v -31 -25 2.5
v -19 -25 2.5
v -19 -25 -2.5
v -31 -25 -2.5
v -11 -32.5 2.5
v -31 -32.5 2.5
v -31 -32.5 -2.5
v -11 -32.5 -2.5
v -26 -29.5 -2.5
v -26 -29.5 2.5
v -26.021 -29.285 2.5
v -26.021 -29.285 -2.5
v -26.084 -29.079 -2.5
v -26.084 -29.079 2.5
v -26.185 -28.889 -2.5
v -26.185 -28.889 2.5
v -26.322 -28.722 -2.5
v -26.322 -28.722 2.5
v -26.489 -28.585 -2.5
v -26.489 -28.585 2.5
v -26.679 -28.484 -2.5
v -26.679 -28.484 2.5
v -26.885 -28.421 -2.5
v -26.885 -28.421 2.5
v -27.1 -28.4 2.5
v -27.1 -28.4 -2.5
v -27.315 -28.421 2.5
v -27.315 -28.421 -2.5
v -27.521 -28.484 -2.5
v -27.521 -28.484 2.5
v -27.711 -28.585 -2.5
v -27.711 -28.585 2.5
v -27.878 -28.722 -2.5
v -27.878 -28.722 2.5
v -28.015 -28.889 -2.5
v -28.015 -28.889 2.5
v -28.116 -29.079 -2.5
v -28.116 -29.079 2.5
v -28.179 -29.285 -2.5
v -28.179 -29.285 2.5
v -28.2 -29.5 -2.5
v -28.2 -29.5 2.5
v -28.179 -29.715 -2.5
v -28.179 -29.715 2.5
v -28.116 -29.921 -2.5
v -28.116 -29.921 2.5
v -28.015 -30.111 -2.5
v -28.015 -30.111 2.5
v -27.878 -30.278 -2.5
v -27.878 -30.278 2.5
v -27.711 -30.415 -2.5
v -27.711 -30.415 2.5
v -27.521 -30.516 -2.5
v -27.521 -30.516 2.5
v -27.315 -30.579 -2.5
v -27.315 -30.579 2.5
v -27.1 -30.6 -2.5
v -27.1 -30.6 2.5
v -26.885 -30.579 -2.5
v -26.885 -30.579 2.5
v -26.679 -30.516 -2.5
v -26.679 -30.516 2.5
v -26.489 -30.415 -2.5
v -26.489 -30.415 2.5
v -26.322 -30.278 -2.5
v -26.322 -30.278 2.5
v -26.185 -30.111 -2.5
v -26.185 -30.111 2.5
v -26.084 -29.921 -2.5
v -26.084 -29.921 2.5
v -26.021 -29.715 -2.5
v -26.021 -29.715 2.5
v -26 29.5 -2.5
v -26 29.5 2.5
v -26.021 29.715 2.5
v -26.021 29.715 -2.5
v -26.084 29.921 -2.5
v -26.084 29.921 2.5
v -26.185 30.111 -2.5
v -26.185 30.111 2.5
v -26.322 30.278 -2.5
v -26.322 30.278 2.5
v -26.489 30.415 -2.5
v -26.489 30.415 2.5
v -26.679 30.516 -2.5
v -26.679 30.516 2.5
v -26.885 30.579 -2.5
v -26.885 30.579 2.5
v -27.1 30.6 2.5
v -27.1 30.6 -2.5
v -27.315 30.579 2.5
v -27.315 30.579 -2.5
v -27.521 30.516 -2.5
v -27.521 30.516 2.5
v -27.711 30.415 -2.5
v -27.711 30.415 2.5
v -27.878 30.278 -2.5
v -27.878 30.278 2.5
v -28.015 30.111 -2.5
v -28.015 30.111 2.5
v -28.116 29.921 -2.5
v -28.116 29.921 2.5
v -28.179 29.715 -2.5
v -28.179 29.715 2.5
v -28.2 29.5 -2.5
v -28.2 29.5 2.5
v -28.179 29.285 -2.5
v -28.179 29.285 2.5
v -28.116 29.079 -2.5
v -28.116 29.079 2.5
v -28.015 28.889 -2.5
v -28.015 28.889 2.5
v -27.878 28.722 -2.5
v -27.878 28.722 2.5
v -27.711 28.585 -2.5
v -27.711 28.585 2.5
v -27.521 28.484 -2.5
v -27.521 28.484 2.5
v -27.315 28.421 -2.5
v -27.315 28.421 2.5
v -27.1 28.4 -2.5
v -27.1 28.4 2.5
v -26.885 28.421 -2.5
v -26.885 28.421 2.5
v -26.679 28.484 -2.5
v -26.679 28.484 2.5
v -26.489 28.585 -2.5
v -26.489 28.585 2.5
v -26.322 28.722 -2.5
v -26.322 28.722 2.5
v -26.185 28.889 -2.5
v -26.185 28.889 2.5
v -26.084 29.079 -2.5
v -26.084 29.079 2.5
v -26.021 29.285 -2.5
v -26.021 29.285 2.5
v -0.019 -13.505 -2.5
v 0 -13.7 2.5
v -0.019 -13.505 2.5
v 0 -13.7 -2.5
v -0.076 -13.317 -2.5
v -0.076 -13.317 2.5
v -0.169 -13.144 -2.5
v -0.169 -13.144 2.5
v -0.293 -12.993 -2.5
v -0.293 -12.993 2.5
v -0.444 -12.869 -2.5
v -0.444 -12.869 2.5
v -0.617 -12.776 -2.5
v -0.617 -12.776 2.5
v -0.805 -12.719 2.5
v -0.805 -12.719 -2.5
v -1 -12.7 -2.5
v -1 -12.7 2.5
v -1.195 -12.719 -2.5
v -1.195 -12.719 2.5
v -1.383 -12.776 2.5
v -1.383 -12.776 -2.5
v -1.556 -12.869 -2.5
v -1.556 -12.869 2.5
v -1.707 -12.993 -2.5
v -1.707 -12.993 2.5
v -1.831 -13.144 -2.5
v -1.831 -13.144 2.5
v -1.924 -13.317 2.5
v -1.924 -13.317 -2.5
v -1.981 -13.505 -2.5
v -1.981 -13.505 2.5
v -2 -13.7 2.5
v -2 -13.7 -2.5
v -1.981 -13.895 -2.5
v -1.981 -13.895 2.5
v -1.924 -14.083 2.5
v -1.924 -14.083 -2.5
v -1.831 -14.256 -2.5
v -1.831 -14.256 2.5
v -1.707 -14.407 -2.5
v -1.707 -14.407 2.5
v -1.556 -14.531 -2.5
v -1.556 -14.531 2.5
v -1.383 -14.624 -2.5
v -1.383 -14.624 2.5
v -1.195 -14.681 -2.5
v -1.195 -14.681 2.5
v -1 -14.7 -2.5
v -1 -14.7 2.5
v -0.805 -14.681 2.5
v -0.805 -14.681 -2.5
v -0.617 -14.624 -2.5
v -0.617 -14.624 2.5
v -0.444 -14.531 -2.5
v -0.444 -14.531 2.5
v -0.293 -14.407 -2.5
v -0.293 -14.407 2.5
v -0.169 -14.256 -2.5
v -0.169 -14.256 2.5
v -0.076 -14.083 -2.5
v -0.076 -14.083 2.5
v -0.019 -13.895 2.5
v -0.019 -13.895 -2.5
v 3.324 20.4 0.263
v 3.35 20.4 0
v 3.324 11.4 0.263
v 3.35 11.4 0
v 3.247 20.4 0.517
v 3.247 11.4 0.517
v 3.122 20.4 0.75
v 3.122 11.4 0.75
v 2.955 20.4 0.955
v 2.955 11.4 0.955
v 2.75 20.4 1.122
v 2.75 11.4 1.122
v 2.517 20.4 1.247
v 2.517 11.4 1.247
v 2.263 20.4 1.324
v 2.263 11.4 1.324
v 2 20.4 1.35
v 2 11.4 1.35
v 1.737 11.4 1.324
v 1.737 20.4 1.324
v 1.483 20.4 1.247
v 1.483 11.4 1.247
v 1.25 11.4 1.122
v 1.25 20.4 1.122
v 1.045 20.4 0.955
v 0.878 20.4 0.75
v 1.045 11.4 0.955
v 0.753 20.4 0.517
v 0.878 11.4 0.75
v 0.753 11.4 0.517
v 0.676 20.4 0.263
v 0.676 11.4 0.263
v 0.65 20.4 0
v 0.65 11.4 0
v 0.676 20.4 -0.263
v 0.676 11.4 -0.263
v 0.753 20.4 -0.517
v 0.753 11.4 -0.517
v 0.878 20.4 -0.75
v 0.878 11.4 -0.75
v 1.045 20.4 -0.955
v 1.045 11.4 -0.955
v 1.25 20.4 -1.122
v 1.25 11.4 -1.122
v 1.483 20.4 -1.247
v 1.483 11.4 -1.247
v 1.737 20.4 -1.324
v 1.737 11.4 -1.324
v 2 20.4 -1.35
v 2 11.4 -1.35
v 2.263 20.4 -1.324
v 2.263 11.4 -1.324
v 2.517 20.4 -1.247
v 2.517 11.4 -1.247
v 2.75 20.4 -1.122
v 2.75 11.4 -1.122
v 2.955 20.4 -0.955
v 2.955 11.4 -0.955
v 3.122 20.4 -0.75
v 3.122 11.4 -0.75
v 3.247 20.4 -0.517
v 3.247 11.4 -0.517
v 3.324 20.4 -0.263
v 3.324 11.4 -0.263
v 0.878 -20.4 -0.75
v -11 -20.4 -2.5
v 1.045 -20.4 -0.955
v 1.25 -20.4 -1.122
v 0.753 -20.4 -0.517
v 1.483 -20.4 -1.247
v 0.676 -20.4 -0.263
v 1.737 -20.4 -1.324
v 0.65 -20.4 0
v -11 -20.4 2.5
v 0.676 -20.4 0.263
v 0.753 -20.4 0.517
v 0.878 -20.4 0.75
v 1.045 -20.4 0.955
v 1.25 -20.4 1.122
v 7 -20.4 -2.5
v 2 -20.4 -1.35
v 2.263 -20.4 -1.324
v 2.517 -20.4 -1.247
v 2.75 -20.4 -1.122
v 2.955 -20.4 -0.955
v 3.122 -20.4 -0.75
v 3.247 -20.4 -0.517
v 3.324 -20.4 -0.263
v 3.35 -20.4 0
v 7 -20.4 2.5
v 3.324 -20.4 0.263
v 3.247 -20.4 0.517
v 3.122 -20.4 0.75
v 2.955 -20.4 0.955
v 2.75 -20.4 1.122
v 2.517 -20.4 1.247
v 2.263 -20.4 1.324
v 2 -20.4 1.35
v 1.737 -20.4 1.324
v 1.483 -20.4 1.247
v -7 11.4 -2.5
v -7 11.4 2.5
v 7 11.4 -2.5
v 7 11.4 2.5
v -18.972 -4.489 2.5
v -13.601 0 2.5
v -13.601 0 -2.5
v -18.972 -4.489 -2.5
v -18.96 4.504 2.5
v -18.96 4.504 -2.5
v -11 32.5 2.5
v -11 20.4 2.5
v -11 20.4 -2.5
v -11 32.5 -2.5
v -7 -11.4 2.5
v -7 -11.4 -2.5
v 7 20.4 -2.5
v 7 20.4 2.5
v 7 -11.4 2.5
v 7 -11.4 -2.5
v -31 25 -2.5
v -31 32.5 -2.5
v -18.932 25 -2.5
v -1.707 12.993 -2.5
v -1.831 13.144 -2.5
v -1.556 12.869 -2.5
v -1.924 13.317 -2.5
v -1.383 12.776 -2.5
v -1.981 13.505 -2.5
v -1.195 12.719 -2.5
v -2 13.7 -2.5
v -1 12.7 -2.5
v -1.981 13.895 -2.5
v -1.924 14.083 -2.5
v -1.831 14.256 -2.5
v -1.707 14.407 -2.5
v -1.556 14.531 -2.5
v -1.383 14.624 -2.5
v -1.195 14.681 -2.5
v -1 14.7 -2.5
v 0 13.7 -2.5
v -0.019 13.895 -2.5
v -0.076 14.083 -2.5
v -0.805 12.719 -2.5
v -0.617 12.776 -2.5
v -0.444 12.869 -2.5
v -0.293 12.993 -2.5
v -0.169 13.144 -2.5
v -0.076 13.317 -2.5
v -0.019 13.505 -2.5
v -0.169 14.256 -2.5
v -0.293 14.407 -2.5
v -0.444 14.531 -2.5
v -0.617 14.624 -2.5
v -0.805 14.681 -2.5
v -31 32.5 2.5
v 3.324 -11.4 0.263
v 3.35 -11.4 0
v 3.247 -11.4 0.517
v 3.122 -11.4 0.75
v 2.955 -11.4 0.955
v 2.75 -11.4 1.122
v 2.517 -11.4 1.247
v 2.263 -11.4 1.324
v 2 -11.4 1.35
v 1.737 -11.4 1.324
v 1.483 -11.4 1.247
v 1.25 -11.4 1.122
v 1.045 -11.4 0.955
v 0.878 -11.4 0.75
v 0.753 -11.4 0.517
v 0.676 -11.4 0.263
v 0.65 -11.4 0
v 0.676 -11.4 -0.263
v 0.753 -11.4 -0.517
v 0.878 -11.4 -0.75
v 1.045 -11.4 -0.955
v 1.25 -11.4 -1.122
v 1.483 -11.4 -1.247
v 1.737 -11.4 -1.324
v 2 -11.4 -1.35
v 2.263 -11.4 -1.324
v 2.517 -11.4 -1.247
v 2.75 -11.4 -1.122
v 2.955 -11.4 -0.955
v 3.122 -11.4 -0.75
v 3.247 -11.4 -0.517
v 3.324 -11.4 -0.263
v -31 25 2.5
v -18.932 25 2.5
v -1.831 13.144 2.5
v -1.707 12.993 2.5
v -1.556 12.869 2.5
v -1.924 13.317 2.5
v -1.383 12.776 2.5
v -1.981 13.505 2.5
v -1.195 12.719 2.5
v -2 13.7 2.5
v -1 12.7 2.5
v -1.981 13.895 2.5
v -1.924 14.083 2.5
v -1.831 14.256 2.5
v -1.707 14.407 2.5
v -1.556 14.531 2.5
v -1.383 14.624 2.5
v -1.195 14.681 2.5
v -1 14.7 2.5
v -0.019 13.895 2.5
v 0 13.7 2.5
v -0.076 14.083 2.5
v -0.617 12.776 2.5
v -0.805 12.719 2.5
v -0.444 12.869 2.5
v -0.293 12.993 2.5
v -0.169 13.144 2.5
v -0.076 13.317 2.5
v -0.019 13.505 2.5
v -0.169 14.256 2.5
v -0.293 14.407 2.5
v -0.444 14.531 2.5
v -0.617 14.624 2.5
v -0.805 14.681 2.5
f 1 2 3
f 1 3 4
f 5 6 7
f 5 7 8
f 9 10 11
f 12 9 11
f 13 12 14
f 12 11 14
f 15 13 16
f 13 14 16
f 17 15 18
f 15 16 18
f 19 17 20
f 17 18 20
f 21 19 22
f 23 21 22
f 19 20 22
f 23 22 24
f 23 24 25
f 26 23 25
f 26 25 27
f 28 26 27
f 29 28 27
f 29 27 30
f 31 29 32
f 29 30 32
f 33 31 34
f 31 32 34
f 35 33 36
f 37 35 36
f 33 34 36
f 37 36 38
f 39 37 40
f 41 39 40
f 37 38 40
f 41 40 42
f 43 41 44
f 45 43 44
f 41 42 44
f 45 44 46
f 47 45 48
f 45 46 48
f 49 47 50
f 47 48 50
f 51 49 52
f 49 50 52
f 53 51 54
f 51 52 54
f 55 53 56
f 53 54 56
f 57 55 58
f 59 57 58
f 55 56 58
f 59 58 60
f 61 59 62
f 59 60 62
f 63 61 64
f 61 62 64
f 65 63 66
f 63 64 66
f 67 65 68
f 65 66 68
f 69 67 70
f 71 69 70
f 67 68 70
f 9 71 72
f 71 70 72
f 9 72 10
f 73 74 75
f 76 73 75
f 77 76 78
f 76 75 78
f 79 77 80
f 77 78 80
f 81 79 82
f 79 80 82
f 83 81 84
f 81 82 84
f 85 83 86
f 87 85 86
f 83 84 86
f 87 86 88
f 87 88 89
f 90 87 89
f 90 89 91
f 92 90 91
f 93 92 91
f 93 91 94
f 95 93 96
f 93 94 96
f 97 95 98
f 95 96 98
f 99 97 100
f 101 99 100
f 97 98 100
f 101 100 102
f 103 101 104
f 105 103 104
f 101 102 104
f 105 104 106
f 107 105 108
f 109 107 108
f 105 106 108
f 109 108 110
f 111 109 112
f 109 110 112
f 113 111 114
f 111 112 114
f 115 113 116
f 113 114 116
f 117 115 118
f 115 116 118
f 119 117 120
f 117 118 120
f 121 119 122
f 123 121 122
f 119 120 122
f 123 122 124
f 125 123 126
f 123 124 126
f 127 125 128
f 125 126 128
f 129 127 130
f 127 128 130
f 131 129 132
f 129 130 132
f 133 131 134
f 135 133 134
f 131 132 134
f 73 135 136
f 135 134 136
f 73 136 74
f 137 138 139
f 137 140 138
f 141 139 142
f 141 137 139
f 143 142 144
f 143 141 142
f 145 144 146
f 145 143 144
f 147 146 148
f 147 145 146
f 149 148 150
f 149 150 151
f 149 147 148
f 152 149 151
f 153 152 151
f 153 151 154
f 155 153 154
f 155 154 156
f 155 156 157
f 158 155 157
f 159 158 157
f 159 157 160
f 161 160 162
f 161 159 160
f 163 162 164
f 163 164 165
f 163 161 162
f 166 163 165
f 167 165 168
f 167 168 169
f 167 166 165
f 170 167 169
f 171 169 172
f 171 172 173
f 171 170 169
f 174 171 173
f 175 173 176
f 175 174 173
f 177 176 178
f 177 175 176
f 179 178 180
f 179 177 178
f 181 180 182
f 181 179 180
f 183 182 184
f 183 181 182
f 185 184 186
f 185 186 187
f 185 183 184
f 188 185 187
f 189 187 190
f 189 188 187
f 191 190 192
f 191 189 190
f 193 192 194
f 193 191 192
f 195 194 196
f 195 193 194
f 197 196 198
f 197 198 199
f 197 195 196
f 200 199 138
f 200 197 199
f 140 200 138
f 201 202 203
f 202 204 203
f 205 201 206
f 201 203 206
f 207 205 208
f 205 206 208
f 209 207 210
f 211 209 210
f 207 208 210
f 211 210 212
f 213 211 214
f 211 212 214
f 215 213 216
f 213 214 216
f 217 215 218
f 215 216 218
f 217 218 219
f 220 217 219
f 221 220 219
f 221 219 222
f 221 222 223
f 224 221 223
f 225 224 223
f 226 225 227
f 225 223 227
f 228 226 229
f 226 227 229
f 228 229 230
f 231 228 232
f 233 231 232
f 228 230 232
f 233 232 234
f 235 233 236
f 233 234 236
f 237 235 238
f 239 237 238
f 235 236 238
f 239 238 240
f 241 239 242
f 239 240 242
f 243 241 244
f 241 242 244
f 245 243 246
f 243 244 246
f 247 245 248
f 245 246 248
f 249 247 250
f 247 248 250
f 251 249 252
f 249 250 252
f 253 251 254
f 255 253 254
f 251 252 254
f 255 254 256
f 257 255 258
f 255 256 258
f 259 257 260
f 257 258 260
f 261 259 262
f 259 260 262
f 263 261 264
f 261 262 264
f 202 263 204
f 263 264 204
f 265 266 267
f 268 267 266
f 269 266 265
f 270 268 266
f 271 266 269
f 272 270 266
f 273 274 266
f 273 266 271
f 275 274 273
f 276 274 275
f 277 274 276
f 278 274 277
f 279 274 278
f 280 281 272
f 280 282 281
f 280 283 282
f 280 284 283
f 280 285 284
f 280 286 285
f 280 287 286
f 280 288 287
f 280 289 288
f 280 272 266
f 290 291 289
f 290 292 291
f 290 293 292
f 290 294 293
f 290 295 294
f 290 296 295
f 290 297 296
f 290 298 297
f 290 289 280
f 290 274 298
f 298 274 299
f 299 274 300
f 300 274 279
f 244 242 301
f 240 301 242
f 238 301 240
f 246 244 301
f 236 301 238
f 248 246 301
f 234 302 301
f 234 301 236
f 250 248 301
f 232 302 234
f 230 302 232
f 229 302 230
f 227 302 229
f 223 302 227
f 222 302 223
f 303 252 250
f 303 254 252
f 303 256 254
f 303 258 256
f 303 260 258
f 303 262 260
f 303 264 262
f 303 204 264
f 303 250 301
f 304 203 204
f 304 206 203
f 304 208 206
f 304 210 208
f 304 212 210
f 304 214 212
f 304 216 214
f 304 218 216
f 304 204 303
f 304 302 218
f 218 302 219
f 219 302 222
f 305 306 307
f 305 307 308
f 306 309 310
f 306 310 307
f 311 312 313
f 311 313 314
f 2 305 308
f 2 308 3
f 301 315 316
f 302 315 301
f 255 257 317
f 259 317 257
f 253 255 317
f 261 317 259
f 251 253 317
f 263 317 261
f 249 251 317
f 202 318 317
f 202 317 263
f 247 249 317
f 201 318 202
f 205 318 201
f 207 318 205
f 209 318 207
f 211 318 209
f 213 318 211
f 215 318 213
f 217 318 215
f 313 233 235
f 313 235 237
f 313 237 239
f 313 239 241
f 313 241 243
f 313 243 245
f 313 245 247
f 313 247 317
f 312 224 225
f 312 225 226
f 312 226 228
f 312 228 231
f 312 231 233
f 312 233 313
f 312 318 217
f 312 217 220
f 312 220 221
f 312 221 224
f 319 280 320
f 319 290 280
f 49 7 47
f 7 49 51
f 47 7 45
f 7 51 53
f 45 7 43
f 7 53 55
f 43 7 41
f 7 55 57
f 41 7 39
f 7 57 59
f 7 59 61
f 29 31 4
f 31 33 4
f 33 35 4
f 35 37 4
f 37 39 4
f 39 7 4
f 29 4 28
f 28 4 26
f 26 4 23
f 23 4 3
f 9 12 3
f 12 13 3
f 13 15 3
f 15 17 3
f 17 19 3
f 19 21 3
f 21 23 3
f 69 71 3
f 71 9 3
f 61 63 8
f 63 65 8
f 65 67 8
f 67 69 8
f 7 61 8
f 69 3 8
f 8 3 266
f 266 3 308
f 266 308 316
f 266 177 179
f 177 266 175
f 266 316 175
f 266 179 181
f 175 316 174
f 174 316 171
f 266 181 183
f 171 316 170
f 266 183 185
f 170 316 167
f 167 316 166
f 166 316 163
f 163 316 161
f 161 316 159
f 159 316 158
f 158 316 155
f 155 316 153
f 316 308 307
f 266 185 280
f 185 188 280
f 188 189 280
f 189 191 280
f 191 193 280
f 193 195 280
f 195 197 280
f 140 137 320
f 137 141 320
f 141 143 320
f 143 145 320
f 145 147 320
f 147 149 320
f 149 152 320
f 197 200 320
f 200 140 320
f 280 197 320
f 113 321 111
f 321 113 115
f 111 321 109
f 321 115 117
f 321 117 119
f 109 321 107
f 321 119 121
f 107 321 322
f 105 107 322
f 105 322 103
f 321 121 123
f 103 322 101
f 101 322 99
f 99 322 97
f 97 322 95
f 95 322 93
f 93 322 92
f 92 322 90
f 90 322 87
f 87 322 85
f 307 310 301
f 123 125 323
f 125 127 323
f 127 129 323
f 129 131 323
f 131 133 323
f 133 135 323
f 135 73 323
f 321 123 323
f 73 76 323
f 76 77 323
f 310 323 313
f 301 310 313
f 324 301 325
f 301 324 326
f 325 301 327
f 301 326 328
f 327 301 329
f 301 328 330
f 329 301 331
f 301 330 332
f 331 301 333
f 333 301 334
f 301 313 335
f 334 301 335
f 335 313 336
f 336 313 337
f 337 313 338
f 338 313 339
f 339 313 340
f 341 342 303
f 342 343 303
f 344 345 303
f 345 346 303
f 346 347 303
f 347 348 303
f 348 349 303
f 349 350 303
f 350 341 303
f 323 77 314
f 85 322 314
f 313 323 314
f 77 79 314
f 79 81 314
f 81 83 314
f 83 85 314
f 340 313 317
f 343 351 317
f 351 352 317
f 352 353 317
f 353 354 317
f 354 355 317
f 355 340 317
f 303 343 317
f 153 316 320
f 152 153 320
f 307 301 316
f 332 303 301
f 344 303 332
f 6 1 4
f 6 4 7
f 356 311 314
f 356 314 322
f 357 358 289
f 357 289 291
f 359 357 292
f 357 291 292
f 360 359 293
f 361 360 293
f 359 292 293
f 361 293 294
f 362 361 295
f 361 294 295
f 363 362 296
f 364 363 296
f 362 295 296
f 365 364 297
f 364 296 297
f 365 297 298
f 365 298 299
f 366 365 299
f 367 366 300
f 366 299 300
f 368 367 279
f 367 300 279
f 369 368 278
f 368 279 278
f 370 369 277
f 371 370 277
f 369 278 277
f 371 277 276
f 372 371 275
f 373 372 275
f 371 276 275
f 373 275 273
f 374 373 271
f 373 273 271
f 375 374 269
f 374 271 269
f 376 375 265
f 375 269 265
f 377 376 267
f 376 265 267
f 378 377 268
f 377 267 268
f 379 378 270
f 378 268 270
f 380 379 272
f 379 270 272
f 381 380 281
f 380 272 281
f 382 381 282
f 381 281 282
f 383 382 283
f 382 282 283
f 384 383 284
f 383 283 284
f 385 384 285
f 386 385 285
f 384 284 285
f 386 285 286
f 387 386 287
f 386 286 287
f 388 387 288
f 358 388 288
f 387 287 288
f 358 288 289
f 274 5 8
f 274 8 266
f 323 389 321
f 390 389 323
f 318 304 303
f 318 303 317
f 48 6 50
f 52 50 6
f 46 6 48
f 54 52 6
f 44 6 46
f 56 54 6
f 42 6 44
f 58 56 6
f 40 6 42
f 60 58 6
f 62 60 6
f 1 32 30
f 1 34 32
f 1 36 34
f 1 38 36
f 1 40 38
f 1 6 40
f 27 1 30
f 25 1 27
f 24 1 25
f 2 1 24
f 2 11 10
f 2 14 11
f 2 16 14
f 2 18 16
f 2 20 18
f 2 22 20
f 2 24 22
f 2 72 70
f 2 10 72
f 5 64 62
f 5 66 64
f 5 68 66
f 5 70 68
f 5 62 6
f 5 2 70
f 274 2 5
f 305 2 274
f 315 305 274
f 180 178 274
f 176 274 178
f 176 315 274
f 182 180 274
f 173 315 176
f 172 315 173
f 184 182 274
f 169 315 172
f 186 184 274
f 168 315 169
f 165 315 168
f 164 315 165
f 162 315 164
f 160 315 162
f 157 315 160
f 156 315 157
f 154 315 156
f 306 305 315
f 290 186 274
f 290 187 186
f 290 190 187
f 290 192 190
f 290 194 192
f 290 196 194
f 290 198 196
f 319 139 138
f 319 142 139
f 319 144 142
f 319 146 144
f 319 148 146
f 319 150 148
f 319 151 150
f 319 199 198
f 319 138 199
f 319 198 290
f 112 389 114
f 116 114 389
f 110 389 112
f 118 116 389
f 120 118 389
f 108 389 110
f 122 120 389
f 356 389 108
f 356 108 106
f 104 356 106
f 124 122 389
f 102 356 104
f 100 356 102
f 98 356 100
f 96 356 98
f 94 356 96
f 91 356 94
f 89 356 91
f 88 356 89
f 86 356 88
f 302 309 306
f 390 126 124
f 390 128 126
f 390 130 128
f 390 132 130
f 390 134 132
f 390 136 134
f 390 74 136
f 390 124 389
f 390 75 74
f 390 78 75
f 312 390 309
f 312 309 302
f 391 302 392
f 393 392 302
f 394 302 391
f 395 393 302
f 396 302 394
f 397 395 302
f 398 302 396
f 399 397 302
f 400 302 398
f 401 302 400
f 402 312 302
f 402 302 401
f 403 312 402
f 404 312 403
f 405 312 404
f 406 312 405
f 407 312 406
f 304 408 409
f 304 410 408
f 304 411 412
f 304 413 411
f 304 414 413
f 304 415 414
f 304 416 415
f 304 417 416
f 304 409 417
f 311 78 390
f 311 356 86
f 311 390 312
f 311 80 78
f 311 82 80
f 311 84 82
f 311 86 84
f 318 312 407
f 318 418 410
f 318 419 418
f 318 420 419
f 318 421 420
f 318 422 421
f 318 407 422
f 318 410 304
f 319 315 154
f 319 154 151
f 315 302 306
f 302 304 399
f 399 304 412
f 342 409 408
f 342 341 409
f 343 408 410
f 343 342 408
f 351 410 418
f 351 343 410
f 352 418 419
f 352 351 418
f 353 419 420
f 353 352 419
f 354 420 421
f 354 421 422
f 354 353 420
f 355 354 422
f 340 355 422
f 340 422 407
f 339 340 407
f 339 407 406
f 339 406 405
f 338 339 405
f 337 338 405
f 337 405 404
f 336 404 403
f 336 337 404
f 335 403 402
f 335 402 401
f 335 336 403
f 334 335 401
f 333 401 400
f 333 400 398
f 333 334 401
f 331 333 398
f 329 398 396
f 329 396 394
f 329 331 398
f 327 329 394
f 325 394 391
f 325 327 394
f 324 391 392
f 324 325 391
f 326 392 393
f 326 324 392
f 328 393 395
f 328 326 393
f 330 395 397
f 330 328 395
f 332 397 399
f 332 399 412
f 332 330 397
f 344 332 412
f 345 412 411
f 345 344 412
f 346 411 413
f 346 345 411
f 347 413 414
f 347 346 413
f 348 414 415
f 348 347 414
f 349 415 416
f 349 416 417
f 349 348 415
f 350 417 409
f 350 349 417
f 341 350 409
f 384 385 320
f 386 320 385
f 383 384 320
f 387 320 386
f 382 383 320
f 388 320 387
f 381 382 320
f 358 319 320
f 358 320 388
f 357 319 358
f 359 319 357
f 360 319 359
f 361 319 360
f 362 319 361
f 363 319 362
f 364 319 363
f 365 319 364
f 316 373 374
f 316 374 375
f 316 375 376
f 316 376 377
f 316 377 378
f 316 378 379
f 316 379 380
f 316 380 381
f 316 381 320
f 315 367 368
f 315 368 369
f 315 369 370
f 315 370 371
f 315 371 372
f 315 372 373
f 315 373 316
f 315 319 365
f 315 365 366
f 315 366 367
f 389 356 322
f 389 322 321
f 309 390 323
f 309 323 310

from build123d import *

# Parameters (mm, degrees)
F0_R     = 1
F1_DEPTH = 2.5
F3_DEPTH = 25
F6_DEPTH = 5
F7_R     = 1.1
F8_DEPTH = 5


with BuildPart() as f1:
    # F0 (on Top) → F1 (new body, symmetric)
    with BuildSketch(Plane.XY):
        Polygon((-7, -11.4), (-7, 11.4), (7, 11.4), (7, 20.4), (-11, 20.4), (-11, -20.4), (7, -20.4), (7, -11.4), align=None)
        with Locations((-1, -13.7)):
            Circle(F0_R, mode=Mode.SUBTRACT)
        with Locations((-1, 13.7)):
            Circle(F0_R, mode=Mode.SUBTRACT)
    extrude(amount=F1_DEPTH, both=True)

    # F2 (on Front) → F3 (cut, symmetric)
    with BuildSketch(Plane.XZ):
        with BuildLine():
            ThreePointArc((0.65, 0), (2, -1.35), (3.35, 0))
            ThreePointArc((3.35, 0), (2, 1.35), (0.65, 0))
        make_face()
    extrude(amount=F3_DEPTH, both=True, mode=Mode.SUBTRACT)

    # F5 (on offset) → F6 (join)
    with BuildSketch(Plane.XY.offset(2.5)):
        Polygon((-31, -25), (-31, -32.5), (-11, -32.5), (-11, 32.5), (-31, 32.5), (-31, 25), (-18.9318980411, 25), (-18.9598145062, 4.5039191309), (-13.6012034491, 0), (-18.9720636301, -4.4893051708), (-19, -25), align=None)
    extrude(amount=-F6_DEPTH)

    # F7 (on offset) → F8 (cut, through all)
    with BuildSketch(Plane.XY.offset(2.5)):
        with Locations((-27.1, 29.5)):
            Circle(F7_R)
        with Locations((-27.1, -29.5)):
            Circle(F7_R)
    extrude(amount=-F8_DEPTH, mode=Mode.SUBTRACT)


solid = f1.part
